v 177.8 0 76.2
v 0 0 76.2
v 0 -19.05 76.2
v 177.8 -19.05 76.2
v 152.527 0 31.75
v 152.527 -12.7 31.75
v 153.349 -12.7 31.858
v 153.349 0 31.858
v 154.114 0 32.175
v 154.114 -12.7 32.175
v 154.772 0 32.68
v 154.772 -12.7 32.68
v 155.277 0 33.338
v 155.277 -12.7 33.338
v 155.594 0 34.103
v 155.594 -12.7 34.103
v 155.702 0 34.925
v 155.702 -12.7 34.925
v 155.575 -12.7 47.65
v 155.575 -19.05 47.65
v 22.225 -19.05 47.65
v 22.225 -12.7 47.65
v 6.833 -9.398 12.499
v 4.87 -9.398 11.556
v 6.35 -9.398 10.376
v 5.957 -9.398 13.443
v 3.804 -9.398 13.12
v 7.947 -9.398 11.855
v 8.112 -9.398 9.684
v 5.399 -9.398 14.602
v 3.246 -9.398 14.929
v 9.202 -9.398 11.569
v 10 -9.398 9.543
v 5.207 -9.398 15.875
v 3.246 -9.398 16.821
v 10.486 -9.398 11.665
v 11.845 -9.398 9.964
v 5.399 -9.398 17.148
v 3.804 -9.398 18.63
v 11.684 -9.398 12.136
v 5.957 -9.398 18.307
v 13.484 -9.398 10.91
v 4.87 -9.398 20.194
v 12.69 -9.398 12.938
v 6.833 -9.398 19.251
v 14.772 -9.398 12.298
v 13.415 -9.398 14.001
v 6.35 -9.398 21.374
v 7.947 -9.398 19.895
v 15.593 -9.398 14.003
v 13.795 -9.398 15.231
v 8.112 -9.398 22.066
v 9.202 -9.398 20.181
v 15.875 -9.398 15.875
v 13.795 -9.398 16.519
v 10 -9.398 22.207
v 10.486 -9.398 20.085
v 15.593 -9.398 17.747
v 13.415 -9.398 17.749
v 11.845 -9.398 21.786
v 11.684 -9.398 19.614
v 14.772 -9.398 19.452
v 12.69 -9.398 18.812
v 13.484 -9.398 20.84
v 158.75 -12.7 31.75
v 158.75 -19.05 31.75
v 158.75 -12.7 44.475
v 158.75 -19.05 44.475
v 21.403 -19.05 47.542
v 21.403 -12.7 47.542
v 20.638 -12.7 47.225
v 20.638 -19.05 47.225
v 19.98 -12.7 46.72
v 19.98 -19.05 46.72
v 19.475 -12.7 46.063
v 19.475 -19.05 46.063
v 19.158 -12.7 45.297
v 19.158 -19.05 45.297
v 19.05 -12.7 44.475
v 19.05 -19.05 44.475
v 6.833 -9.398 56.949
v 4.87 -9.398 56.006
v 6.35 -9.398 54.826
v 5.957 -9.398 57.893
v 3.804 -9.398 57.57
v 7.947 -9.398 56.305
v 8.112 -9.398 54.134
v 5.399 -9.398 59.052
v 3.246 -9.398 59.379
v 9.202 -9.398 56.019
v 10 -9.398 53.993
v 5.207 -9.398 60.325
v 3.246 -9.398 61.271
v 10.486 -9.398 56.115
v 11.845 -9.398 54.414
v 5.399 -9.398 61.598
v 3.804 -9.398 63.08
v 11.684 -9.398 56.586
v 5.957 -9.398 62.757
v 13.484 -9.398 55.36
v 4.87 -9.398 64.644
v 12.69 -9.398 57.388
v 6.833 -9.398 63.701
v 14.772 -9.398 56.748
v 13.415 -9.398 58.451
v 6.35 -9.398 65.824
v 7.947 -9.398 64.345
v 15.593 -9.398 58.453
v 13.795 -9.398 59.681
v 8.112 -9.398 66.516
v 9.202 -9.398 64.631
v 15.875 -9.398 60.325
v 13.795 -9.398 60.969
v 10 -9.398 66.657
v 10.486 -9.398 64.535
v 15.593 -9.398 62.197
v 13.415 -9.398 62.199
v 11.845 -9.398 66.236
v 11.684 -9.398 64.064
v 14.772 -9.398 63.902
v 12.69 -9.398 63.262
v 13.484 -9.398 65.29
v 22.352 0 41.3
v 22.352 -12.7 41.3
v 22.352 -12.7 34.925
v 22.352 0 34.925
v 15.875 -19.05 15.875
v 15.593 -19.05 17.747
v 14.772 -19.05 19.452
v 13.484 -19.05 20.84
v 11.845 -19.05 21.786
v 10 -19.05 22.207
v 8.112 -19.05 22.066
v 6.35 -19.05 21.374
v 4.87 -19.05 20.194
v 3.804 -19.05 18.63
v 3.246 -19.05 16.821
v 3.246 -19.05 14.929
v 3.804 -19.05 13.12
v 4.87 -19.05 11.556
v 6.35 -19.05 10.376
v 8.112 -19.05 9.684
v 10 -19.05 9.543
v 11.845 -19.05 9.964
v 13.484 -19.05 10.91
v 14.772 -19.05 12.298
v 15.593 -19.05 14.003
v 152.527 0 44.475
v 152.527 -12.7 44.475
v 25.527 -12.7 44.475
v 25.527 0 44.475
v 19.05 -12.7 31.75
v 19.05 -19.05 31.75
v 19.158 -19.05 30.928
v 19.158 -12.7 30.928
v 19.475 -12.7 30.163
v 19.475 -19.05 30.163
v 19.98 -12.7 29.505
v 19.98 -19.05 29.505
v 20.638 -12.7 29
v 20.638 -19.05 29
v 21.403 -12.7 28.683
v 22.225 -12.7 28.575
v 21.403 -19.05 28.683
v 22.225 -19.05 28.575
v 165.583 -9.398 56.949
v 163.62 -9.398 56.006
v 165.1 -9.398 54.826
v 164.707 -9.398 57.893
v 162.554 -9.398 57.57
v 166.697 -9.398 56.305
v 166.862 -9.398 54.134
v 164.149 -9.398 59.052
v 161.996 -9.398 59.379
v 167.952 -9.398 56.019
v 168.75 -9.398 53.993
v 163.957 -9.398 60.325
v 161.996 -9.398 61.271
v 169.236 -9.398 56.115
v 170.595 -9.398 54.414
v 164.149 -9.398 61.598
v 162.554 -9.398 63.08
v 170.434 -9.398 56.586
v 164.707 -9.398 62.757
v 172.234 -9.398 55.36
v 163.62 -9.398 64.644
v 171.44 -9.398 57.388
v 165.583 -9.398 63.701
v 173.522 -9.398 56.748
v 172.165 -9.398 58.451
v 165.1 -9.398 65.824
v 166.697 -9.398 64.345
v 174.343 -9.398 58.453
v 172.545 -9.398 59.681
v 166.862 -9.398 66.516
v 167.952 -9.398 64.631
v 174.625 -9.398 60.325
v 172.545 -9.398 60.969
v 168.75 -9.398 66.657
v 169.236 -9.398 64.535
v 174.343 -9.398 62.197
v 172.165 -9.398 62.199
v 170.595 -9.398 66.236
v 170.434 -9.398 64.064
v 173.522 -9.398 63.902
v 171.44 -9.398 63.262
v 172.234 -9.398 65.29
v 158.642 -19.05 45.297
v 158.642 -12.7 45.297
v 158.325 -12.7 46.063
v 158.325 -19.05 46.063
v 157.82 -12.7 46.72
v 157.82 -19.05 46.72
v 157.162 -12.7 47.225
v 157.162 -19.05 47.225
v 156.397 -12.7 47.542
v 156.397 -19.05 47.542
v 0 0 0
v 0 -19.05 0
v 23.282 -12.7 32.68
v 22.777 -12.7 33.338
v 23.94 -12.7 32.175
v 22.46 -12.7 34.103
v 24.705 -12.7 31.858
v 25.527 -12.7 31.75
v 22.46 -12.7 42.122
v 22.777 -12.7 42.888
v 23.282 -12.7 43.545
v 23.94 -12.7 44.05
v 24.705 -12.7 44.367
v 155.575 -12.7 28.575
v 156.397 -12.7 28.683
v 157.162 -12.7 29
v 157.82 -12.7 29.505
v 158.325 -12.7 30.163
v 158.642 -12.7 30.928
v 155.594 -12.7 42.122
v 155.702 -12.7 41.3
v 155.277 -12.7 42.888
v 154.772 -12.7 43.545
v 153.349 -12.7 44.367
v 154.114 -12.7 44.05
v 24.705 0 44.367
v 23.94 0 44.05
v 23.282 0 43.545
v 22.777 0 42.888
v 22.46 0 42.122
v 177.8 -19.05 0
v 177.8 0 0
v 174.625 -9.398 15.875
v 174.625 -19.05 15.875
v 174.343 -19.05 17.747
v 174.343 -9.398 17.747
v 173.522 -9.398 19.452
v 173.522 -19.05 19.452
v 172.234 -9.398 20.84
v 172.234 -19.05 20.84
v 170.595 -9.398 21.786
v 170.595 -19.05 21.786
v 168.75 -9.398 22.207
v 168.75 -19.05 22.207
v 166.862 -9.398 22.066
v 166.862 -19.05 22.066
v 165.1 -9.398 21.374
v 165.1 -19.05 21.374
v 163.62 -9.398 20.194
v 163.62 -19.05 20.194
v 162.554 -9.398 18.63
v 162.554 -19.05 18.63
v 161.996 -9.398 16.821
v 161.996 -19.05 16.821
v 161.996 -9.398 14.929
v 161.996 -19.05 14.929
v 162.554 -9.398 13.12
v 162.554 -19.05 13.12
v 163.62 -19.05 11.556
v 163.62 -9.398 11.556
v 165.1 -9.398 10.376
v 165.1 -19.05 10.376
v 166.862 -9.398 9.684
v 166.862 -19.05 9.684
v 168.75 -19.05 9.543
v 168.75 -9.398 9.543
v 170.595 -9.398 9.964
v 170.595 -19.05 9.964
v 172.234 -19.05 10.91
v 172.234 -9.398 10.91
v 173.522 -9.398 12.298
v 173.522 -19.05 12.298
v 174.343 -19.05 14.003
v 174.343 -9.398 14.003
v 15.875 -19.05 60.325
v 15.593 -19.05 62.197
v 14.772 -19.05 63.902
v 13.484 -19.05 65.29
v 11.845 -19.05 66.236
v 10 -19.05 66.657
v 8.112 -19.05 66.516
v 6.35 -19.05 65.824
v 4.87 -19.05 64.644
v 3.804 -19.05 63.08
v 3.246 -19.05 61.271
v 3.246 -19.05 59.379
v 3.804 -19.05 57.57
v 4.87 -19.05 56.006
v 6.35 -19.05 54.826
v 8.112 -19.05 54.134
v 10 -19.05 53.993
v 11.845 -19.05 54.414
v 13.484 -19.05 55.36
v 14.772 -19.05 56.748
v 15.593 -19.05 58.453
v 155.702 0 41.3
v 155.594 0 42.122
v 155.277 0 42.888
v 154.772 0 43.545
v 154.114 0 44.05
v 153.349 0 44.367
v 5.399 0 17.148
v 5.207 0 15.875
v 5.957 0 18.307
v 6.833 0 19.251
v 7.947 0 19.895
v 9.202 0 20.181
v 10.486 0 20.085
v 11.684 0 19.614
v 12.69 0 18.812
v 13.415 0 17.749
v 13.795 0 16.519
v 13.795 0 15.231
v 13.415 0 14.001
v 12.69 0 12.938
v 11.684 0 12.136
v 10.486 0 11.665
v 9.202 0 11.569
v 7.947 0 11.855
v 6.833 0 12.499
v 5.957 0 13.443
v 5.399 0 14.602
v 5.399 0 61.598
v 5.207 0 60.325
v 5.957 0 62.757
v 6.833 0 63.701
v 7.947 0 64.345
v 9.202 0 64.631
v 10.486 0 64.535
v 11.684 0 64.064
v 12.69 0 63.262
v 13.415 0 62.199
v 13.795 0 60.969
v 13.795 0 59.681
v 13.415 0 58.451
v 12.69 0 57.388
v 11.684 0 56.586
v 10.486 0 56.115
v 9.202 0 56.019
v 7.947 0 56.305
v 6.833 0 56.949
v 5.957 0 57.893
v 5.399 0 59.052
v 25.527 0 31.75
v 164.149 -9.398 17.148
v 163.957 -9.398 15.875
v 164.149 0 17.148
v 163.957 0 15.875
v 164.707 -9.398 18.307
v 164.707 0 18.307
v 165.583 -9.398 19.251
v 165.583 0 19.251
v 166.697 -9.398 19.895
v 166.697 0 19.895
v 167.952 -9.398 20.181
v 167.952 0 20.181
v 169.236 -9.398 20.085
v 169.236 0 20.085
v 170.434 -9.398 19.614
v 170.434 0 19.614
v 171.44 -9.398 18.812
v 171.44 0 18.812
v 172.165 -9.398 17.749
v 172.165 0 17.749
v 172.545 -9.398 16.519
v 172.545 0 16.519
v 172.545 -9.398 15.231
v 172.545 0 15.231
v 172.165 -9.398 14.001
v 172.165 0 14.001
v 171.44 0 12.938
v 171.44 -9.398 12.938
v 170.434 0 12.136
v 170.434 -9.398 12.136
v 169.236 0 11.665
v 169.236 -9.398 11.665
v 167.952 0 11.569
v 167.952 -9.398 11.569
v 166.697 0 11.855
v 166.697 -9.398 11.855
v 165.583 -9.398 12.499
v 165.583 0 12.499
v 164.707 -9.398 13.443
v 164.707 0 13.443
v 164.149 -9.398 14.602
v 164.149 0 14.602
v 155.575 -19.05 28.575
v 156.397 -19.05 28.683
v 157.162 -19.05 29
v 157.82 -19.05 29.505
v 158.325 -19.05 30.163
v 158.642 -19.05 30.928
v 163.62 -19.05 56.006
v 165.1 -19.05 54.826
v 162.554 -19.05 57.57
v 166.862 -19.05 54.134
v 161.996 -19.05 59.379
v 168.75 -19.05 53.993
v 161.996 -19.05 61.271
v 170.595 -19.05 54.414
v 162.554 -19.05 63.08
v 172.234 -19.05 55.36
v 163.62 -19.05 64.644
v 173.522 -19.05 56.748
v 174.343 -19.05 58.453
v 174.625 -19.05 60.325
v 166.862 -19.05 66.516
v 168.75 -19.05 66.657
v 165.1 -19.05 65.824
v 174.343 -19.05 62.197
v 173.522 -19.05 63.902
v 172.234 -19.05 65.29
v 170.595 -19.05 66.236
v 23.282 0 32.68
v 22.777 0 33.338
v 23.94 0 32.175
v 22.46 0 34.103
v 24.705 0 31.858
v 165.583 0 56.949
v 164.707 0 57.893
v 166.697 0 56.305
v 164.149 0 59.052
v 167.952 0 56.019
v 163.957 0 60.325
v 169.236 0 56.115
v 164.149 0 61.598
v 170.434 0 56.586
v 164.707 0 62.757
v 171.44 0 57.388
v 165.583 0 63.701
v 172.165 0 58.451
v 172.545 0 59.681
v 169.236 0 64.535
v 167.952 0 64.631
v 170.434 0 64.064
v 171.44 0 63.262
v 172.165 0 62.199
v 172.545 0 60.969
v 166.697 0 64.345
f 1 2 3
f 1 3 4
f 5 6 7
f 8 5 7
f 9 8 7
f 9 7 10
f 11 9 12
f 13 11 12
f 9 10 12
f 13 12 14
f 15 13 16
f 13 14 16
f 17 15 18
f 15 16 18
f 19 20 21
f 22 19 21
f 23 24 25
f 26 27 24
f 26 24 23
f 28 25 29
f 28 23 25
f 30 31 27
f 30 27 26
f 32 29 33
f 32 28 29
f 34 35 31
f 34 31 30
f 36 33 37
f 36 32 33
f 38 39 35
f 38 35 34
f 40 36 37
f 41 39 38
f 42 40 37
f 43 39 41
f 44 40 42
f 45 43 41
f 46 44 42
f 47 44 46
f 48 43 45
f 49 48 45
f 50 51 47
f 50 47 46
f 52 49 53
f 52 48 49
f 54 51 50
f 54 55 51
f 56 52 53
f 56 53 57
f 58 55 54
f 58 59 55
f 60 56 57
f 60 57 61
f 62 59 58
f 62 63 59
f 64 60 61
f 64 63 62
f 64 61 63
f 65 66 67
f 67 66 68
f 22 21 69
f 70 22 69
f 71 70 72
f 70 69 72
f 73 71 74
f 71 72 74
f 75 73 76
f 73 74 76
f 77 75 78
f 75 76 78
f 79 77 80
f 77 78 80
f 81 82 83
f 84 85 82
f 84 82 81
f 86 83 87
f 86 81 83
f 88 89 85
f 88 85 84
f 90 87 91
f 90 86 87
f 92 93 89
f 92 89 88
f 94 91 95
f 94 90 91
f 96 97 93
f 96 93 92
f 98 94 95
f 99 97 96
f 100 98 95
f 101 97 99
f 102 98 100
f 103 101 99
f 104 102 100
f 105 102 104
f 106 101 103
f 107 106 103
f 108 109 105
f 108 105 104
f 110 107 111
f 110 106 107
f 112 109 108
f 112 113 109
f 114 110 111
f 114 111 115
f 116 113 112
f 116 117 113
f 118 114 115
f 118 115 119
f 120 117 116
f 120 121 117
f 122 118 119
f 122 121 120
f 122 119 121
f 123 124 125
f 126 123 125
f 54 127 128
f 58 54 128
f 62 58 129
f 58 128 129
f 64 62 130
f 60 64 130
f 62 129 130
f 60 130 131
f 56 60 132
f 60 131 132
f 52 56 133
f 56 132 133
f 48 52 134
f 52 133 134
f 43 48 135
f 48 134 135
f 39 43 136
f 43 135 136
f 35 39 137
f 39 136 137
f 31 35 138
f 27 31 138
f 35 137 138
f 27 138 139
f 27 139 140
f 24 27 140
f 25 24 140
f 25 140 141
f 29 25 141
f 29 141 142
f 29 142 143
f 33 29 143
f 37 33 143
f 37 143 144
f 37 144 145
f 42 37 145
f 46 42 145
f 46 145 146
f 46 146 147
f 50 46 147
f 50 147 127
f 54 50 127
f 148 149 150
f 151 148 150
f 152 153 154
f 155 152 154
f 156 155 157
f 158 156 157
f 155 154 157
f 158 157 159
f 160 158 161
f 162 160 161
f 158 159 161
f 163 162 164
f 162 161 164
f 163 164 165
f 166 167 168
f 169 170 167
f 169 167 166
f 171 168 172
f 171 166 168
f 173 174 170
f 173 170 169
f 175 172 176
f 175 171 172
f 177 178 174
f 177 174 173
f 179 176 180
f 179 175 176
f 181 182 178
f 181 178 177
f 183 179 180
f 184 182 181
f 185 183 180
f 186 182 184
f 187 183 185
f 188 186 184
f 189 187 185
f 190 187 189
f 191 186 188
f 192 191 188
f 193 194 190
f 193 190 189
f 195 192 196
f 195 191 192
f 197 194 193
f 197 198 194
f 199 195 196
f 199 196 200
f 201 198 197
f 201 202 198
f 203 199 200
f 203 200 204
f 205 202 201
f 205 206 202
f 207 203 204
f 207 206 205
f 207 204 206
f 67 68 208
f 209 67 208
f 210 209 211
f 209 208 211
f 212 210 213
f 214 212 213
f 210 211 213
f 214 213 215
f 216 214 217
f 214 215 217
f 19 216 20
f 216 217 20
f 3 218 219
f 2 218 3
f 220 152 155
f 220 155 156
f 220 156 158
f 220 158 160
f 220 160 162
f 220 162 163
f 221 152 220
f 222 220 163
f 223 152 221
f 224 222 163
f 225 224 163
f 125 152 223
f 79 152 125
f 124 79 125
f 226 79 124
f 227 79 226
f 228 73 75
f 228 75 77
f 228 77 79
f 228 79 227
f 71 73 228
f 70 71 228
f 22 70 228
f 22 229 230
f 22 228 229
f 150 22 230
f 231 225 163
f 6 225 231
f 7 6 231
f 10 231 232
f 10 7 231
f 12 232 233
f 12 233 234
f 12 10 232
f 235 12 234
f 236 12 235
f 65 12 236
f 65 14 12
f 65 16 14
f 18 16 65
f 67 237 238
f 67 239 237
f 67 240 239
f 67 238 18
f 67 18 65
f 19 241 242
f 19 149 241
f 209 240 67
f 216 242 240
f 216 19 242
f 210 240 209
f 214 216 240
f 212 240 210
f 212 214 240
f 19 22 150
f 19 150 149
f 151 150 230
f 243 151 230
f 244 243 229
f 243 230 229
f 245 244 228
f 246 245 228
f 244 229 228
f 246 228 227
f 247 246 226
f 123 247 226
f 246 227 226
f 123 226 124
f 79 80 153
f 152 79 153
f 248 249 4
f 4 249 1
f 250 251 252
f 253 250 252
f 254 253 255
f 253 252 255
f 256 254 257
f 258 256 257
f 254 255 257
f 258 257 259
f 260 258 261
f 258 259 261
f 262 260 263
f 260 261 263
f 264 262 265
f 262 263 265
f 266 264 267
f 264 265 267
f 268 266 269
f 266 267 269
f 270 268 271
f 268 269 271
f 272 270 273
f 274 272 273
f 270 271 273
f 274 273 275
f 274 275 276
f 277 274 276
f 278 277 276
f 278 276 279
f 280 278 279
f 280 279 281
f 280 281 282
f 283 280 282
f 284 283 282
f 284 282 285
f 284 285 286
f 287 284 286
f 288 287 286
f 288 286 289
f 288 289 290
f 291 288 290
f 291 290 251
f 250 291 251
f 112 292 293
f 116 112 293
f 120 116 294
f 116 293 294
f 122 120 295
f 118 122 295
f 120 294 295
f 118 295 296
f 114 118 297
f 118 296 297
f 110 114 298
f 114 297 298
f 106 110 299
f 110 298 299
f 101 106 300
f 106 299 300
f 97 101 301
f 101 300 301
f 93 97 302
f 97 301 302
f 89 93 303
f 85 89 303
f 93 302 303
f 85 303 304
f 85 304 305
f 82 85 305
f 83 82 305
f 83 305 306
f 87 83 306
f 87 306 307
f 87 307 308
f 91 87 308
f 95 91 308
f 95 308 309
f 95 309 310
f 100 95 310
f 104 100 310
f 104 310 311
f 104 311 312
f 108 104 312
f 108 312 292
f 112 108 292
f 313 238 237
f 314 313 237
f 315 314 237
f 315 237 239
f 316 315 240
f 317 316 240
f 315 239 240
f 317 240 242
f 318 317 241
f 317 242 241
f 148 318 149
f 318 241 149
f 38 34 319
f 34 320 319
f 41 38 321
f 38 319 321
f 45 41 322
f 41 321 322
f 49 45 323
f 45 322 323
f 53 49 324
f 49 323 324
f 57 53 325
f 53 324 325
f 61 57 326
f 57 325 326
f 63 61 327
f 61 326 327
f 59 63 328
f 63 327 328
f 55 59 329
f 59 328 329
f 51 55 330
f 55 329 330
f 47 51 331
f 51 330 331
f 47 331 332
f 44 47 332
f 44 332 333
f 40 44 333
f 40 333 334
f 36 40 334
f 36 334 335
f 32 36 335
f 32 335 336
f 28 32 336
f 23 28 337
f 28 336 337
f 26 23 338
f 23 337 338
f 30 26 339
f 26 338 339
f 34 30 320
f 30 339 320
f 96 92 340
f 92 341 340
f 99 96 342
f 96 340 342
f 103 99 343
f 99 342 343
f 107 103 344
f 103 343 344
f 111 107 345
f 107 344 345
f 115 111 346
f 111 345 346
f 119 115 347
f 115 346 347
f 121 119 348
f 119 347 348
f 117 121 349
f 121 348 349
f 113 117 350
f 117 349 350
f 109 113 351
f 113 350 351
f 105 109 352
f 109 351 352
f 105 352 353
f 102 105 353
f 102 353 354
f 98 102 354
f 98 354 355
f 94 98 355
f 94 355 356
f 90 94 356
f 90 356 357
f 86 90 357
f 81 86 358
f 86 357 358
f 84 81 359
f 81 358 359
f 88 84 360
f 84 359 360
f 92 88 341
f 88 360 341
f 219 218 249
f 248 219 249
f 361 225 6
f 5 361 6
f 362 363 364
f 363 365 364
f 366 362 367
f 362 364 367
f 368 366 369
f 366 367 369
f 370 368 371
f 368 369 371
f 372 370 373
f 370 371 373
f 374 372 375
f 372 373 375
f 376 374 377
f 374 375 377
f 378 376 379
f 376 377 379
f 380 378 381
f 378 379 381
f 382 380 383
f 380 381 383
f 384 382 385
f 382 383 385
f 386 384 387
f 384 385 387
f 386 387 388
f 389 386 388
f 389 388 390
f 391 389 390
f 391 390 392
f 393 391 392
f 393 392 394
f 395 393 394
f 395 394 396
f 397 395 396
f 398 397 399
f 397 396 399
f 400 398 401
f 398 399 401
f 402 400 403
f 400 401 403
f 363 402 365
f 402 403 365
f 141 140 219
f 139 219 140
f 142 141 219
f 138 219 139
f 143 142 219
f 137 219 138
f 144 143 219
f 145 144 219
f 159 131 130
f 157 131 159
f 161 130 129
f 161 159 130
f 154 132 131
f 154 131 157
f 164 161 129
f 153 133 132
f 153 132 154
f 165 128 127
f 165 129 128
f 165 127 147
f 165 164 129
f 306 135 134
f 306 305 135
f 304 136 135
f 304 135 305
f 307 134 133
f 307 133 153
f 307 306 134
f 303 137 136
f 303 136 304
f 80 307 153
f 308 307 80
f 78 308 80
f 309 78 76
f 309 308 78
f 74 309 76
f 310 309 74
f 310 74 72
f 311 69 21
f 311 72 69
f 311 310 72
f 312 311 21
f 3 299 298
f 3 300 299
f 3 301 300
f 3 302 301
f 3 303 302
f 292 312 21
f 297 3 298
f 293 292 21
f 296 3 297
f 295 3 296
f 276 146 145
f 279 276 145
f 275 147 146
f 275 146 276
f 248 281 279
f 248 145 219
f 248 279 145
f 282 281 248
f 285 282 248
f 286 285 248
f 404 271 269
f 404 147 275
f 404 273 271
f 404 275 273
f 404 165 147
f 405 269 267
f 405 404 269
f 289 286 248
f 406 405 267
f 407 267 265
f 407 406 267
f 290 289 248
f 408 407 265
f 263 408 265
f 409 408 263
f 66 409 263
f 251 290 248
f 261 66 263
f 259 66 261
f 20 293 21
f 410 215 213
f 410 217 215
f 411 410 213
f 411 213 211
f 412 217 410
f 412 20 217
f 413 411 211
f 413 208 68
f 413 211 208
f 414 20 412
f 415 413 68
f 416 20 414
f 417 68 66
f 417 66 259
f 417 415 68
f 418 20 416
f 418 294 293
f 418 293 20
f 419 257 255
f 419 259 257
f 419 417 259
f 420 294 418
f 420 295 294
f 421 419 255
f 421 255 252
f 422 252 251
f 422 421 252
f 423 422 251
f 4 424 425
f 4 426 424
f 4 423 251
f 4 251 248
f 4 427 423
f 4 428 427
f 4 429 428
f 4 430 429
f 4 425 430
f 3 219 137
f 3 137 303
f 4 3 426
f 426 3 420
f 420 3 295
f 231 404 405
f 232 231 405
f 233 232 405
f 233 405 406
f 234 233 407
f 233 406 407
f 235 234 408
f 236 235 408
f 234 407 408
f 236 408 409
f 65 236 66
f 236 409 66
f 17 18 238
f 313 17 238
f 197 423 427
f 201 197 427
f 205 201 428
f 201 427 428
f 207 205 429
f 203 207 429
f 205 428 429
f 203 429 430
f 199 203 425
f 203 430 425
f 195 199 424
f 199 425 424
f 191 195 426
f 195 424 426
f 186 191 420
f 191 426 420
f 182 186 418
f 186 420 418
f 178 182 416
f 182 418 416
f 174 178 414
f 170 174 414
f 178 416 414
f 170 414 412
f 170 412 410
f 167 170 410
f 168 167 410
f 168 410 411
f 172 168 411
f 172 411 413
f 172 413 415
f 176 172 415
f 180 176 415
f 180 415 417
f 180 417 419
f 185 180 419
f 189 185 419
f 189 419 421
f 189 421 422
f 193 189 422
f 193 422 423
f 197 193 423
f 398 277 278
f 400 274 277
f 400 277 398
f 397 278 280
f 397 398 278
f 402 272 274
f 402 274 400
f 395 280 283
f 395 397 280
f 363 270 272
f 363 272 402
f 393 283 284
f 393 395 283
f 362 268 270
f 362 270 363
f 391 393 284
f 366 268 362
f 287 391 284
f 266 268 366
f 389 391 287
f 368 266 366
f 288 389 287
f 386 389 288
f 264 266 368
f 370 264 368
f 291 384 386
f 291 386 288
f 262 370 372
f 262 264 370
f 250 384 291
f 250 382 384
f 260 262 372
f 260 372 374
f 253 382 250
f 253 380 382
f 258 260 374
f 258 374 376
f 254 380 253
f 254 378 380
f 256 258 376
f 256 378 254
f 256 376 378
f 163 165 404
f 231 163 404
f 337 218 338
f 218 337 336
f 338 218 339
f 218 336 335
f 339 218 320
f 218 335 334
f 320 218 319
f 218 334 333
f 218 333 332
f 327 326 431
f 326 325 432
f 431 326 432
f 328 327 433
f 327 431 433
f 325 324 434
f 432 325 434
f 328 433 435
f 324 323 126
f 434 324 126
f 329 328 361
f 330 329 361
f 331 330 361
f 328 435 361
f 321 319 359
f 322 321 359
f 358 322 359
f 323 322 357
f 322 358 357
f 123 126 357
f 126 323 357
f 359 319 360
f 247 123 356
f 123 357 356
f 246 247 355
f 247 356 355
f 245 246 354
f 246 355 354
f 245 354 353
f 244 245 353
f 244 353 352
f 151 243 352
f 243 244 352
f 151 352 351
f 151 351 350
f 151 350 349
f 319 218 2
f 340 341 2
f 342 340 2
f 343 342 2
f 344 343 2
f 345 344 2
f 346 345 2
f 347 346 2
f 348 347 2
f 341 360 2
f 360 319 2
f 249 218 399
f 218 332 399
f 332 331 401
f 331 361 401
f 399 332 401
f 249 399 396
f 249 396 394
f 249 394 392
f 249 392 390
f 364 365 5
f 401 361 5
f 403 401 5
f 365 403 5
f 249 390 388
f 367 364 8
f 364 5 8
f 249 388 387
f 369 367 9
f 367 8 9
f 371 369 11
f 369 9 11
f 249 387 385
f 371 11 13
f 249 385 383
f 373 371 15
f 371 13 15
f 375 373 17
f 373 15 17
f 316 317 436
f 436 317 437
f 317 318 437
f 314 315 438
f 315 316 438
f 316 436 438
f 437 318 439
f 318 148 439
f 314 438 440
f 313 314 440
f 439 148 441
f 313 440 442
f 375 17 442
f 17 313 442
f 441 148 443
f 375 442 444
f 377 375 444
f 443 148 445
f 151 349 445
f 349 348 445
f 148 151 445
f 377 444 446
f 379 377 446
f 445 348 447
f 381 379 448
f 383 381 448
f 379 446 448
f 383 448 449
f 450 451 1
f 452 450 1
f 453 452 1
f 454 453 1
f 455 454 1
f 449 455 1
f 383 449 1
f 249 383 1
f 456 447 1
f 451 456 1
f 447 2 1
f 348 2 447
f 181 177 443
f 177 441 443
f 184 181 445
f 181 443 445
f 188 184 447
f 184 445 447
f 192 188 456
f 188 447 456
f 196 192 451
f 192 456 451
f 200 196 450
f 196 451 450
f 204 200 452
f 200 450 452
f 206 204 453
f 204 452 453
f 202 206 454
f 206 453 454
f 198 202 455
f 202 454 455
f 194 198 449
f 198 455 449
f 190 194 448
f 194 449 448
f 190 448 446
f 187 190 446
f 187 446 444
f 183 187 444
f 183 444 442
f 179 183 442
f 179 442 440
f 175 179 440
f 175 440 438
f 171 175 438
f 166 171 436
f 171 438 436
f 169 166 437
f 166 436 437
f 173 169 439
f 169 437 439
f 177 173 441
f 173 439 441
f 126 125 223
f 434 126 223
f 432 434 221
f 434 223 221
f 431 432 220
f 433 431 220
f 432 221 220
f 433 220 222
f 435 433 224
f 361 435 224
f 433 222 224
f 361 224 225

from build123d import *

# Parameters (mm, degrees)
F0_W           = 177.8
F0_H           = 76.2
F1_DEPTH       = 19.05
F3_DEPTH       = 25.4
F5_DEPTH       = 6.35
F7_D           = 8.636
F7_CBORE_D     = 12.7
F7_CBORE_DEPTH = 9.652


with BuildPart() as f1:
    # F0 (on Front) → F1 (new body)
    with BuildSketch(Plane.XZ):
        with Locations((88.9, 38.1)):
            Rectangle(F0_W, F0_H)
    extrude(amount=F1_DEPTH)

    # F2 (on face) → F3 (cut)
    with BuildSketch(Plane.XZ.offset(19.05)):
        with BuildLine():
            ThreePointArc((22.352, 34.925), (23.281936, 32.679936), (25.527, 31.75))
            Line((25.527, 31.75), (152.527, 31.75))
            ThreePointArc((152.527, 31.75), (154.772064, 32.679936), (155.702, 34.925))
            Line((155.702, 34.925), (155.702, 41.3004))
            ThreePointArc((155.702, 41.3004), (154.772064, 43.545464), (152.527, 44.4754))
            Line((152.527, 44.4754), (25.527, 44.4754))
            ThreePointArc((25.527, 44.4754), (23.281936, 43.545464), (22.352, 41.3004))
            Line((22.352, 41.3004), (22.352, 34.925))
        make_face()
    extrude(amount=-F3_DEPTH, mode=Mode.SUBTRACT)

    # F4 (on face) → F5 (cut)
    with BuildSketch(Plane.XZ.offset(19.05)):
        with BuildLine():
            Line((155.575, 47.6504), (22.225, 47.6504))
            ThreePointArc((22.225, 47.6504), (19.979936, 46.720464), (19.05, 44.4754))
            Line((19.05, 44.4754), (19.05, 31.75))
            ThreePointArc((19.05, 31.75), (19.979936, 29.504936), (22.225, 28.575))
            Line((22.225, 28.575), (155.575, 28.575))
            ThreePointArc((155.575, 28.575), (157.820064, 29.504936), (158.75, 31.75))
            Line((158.75, 31.75), (158.75, 44.4754))
            ThreePointArc((158.75, 44.4754), (157.820064, 46.720464), (155.575, 47.6504))
        make_face()
    extrude(amount=-F5_DEPTH, mode=Mode.SUBTRACT)

    # F7 (through all)
    with Locations(Plane.XZ.offset(19.05)):
        with Locations((9.525, 15.875), (9.525, 60.325), (168.275, 60.325), (168.275, 15.875)):
            CounterBoreHole(F7_D / 2, F7_CBORE_D / 2, F7_CBORE_DEPTH)


solid = f1.part
